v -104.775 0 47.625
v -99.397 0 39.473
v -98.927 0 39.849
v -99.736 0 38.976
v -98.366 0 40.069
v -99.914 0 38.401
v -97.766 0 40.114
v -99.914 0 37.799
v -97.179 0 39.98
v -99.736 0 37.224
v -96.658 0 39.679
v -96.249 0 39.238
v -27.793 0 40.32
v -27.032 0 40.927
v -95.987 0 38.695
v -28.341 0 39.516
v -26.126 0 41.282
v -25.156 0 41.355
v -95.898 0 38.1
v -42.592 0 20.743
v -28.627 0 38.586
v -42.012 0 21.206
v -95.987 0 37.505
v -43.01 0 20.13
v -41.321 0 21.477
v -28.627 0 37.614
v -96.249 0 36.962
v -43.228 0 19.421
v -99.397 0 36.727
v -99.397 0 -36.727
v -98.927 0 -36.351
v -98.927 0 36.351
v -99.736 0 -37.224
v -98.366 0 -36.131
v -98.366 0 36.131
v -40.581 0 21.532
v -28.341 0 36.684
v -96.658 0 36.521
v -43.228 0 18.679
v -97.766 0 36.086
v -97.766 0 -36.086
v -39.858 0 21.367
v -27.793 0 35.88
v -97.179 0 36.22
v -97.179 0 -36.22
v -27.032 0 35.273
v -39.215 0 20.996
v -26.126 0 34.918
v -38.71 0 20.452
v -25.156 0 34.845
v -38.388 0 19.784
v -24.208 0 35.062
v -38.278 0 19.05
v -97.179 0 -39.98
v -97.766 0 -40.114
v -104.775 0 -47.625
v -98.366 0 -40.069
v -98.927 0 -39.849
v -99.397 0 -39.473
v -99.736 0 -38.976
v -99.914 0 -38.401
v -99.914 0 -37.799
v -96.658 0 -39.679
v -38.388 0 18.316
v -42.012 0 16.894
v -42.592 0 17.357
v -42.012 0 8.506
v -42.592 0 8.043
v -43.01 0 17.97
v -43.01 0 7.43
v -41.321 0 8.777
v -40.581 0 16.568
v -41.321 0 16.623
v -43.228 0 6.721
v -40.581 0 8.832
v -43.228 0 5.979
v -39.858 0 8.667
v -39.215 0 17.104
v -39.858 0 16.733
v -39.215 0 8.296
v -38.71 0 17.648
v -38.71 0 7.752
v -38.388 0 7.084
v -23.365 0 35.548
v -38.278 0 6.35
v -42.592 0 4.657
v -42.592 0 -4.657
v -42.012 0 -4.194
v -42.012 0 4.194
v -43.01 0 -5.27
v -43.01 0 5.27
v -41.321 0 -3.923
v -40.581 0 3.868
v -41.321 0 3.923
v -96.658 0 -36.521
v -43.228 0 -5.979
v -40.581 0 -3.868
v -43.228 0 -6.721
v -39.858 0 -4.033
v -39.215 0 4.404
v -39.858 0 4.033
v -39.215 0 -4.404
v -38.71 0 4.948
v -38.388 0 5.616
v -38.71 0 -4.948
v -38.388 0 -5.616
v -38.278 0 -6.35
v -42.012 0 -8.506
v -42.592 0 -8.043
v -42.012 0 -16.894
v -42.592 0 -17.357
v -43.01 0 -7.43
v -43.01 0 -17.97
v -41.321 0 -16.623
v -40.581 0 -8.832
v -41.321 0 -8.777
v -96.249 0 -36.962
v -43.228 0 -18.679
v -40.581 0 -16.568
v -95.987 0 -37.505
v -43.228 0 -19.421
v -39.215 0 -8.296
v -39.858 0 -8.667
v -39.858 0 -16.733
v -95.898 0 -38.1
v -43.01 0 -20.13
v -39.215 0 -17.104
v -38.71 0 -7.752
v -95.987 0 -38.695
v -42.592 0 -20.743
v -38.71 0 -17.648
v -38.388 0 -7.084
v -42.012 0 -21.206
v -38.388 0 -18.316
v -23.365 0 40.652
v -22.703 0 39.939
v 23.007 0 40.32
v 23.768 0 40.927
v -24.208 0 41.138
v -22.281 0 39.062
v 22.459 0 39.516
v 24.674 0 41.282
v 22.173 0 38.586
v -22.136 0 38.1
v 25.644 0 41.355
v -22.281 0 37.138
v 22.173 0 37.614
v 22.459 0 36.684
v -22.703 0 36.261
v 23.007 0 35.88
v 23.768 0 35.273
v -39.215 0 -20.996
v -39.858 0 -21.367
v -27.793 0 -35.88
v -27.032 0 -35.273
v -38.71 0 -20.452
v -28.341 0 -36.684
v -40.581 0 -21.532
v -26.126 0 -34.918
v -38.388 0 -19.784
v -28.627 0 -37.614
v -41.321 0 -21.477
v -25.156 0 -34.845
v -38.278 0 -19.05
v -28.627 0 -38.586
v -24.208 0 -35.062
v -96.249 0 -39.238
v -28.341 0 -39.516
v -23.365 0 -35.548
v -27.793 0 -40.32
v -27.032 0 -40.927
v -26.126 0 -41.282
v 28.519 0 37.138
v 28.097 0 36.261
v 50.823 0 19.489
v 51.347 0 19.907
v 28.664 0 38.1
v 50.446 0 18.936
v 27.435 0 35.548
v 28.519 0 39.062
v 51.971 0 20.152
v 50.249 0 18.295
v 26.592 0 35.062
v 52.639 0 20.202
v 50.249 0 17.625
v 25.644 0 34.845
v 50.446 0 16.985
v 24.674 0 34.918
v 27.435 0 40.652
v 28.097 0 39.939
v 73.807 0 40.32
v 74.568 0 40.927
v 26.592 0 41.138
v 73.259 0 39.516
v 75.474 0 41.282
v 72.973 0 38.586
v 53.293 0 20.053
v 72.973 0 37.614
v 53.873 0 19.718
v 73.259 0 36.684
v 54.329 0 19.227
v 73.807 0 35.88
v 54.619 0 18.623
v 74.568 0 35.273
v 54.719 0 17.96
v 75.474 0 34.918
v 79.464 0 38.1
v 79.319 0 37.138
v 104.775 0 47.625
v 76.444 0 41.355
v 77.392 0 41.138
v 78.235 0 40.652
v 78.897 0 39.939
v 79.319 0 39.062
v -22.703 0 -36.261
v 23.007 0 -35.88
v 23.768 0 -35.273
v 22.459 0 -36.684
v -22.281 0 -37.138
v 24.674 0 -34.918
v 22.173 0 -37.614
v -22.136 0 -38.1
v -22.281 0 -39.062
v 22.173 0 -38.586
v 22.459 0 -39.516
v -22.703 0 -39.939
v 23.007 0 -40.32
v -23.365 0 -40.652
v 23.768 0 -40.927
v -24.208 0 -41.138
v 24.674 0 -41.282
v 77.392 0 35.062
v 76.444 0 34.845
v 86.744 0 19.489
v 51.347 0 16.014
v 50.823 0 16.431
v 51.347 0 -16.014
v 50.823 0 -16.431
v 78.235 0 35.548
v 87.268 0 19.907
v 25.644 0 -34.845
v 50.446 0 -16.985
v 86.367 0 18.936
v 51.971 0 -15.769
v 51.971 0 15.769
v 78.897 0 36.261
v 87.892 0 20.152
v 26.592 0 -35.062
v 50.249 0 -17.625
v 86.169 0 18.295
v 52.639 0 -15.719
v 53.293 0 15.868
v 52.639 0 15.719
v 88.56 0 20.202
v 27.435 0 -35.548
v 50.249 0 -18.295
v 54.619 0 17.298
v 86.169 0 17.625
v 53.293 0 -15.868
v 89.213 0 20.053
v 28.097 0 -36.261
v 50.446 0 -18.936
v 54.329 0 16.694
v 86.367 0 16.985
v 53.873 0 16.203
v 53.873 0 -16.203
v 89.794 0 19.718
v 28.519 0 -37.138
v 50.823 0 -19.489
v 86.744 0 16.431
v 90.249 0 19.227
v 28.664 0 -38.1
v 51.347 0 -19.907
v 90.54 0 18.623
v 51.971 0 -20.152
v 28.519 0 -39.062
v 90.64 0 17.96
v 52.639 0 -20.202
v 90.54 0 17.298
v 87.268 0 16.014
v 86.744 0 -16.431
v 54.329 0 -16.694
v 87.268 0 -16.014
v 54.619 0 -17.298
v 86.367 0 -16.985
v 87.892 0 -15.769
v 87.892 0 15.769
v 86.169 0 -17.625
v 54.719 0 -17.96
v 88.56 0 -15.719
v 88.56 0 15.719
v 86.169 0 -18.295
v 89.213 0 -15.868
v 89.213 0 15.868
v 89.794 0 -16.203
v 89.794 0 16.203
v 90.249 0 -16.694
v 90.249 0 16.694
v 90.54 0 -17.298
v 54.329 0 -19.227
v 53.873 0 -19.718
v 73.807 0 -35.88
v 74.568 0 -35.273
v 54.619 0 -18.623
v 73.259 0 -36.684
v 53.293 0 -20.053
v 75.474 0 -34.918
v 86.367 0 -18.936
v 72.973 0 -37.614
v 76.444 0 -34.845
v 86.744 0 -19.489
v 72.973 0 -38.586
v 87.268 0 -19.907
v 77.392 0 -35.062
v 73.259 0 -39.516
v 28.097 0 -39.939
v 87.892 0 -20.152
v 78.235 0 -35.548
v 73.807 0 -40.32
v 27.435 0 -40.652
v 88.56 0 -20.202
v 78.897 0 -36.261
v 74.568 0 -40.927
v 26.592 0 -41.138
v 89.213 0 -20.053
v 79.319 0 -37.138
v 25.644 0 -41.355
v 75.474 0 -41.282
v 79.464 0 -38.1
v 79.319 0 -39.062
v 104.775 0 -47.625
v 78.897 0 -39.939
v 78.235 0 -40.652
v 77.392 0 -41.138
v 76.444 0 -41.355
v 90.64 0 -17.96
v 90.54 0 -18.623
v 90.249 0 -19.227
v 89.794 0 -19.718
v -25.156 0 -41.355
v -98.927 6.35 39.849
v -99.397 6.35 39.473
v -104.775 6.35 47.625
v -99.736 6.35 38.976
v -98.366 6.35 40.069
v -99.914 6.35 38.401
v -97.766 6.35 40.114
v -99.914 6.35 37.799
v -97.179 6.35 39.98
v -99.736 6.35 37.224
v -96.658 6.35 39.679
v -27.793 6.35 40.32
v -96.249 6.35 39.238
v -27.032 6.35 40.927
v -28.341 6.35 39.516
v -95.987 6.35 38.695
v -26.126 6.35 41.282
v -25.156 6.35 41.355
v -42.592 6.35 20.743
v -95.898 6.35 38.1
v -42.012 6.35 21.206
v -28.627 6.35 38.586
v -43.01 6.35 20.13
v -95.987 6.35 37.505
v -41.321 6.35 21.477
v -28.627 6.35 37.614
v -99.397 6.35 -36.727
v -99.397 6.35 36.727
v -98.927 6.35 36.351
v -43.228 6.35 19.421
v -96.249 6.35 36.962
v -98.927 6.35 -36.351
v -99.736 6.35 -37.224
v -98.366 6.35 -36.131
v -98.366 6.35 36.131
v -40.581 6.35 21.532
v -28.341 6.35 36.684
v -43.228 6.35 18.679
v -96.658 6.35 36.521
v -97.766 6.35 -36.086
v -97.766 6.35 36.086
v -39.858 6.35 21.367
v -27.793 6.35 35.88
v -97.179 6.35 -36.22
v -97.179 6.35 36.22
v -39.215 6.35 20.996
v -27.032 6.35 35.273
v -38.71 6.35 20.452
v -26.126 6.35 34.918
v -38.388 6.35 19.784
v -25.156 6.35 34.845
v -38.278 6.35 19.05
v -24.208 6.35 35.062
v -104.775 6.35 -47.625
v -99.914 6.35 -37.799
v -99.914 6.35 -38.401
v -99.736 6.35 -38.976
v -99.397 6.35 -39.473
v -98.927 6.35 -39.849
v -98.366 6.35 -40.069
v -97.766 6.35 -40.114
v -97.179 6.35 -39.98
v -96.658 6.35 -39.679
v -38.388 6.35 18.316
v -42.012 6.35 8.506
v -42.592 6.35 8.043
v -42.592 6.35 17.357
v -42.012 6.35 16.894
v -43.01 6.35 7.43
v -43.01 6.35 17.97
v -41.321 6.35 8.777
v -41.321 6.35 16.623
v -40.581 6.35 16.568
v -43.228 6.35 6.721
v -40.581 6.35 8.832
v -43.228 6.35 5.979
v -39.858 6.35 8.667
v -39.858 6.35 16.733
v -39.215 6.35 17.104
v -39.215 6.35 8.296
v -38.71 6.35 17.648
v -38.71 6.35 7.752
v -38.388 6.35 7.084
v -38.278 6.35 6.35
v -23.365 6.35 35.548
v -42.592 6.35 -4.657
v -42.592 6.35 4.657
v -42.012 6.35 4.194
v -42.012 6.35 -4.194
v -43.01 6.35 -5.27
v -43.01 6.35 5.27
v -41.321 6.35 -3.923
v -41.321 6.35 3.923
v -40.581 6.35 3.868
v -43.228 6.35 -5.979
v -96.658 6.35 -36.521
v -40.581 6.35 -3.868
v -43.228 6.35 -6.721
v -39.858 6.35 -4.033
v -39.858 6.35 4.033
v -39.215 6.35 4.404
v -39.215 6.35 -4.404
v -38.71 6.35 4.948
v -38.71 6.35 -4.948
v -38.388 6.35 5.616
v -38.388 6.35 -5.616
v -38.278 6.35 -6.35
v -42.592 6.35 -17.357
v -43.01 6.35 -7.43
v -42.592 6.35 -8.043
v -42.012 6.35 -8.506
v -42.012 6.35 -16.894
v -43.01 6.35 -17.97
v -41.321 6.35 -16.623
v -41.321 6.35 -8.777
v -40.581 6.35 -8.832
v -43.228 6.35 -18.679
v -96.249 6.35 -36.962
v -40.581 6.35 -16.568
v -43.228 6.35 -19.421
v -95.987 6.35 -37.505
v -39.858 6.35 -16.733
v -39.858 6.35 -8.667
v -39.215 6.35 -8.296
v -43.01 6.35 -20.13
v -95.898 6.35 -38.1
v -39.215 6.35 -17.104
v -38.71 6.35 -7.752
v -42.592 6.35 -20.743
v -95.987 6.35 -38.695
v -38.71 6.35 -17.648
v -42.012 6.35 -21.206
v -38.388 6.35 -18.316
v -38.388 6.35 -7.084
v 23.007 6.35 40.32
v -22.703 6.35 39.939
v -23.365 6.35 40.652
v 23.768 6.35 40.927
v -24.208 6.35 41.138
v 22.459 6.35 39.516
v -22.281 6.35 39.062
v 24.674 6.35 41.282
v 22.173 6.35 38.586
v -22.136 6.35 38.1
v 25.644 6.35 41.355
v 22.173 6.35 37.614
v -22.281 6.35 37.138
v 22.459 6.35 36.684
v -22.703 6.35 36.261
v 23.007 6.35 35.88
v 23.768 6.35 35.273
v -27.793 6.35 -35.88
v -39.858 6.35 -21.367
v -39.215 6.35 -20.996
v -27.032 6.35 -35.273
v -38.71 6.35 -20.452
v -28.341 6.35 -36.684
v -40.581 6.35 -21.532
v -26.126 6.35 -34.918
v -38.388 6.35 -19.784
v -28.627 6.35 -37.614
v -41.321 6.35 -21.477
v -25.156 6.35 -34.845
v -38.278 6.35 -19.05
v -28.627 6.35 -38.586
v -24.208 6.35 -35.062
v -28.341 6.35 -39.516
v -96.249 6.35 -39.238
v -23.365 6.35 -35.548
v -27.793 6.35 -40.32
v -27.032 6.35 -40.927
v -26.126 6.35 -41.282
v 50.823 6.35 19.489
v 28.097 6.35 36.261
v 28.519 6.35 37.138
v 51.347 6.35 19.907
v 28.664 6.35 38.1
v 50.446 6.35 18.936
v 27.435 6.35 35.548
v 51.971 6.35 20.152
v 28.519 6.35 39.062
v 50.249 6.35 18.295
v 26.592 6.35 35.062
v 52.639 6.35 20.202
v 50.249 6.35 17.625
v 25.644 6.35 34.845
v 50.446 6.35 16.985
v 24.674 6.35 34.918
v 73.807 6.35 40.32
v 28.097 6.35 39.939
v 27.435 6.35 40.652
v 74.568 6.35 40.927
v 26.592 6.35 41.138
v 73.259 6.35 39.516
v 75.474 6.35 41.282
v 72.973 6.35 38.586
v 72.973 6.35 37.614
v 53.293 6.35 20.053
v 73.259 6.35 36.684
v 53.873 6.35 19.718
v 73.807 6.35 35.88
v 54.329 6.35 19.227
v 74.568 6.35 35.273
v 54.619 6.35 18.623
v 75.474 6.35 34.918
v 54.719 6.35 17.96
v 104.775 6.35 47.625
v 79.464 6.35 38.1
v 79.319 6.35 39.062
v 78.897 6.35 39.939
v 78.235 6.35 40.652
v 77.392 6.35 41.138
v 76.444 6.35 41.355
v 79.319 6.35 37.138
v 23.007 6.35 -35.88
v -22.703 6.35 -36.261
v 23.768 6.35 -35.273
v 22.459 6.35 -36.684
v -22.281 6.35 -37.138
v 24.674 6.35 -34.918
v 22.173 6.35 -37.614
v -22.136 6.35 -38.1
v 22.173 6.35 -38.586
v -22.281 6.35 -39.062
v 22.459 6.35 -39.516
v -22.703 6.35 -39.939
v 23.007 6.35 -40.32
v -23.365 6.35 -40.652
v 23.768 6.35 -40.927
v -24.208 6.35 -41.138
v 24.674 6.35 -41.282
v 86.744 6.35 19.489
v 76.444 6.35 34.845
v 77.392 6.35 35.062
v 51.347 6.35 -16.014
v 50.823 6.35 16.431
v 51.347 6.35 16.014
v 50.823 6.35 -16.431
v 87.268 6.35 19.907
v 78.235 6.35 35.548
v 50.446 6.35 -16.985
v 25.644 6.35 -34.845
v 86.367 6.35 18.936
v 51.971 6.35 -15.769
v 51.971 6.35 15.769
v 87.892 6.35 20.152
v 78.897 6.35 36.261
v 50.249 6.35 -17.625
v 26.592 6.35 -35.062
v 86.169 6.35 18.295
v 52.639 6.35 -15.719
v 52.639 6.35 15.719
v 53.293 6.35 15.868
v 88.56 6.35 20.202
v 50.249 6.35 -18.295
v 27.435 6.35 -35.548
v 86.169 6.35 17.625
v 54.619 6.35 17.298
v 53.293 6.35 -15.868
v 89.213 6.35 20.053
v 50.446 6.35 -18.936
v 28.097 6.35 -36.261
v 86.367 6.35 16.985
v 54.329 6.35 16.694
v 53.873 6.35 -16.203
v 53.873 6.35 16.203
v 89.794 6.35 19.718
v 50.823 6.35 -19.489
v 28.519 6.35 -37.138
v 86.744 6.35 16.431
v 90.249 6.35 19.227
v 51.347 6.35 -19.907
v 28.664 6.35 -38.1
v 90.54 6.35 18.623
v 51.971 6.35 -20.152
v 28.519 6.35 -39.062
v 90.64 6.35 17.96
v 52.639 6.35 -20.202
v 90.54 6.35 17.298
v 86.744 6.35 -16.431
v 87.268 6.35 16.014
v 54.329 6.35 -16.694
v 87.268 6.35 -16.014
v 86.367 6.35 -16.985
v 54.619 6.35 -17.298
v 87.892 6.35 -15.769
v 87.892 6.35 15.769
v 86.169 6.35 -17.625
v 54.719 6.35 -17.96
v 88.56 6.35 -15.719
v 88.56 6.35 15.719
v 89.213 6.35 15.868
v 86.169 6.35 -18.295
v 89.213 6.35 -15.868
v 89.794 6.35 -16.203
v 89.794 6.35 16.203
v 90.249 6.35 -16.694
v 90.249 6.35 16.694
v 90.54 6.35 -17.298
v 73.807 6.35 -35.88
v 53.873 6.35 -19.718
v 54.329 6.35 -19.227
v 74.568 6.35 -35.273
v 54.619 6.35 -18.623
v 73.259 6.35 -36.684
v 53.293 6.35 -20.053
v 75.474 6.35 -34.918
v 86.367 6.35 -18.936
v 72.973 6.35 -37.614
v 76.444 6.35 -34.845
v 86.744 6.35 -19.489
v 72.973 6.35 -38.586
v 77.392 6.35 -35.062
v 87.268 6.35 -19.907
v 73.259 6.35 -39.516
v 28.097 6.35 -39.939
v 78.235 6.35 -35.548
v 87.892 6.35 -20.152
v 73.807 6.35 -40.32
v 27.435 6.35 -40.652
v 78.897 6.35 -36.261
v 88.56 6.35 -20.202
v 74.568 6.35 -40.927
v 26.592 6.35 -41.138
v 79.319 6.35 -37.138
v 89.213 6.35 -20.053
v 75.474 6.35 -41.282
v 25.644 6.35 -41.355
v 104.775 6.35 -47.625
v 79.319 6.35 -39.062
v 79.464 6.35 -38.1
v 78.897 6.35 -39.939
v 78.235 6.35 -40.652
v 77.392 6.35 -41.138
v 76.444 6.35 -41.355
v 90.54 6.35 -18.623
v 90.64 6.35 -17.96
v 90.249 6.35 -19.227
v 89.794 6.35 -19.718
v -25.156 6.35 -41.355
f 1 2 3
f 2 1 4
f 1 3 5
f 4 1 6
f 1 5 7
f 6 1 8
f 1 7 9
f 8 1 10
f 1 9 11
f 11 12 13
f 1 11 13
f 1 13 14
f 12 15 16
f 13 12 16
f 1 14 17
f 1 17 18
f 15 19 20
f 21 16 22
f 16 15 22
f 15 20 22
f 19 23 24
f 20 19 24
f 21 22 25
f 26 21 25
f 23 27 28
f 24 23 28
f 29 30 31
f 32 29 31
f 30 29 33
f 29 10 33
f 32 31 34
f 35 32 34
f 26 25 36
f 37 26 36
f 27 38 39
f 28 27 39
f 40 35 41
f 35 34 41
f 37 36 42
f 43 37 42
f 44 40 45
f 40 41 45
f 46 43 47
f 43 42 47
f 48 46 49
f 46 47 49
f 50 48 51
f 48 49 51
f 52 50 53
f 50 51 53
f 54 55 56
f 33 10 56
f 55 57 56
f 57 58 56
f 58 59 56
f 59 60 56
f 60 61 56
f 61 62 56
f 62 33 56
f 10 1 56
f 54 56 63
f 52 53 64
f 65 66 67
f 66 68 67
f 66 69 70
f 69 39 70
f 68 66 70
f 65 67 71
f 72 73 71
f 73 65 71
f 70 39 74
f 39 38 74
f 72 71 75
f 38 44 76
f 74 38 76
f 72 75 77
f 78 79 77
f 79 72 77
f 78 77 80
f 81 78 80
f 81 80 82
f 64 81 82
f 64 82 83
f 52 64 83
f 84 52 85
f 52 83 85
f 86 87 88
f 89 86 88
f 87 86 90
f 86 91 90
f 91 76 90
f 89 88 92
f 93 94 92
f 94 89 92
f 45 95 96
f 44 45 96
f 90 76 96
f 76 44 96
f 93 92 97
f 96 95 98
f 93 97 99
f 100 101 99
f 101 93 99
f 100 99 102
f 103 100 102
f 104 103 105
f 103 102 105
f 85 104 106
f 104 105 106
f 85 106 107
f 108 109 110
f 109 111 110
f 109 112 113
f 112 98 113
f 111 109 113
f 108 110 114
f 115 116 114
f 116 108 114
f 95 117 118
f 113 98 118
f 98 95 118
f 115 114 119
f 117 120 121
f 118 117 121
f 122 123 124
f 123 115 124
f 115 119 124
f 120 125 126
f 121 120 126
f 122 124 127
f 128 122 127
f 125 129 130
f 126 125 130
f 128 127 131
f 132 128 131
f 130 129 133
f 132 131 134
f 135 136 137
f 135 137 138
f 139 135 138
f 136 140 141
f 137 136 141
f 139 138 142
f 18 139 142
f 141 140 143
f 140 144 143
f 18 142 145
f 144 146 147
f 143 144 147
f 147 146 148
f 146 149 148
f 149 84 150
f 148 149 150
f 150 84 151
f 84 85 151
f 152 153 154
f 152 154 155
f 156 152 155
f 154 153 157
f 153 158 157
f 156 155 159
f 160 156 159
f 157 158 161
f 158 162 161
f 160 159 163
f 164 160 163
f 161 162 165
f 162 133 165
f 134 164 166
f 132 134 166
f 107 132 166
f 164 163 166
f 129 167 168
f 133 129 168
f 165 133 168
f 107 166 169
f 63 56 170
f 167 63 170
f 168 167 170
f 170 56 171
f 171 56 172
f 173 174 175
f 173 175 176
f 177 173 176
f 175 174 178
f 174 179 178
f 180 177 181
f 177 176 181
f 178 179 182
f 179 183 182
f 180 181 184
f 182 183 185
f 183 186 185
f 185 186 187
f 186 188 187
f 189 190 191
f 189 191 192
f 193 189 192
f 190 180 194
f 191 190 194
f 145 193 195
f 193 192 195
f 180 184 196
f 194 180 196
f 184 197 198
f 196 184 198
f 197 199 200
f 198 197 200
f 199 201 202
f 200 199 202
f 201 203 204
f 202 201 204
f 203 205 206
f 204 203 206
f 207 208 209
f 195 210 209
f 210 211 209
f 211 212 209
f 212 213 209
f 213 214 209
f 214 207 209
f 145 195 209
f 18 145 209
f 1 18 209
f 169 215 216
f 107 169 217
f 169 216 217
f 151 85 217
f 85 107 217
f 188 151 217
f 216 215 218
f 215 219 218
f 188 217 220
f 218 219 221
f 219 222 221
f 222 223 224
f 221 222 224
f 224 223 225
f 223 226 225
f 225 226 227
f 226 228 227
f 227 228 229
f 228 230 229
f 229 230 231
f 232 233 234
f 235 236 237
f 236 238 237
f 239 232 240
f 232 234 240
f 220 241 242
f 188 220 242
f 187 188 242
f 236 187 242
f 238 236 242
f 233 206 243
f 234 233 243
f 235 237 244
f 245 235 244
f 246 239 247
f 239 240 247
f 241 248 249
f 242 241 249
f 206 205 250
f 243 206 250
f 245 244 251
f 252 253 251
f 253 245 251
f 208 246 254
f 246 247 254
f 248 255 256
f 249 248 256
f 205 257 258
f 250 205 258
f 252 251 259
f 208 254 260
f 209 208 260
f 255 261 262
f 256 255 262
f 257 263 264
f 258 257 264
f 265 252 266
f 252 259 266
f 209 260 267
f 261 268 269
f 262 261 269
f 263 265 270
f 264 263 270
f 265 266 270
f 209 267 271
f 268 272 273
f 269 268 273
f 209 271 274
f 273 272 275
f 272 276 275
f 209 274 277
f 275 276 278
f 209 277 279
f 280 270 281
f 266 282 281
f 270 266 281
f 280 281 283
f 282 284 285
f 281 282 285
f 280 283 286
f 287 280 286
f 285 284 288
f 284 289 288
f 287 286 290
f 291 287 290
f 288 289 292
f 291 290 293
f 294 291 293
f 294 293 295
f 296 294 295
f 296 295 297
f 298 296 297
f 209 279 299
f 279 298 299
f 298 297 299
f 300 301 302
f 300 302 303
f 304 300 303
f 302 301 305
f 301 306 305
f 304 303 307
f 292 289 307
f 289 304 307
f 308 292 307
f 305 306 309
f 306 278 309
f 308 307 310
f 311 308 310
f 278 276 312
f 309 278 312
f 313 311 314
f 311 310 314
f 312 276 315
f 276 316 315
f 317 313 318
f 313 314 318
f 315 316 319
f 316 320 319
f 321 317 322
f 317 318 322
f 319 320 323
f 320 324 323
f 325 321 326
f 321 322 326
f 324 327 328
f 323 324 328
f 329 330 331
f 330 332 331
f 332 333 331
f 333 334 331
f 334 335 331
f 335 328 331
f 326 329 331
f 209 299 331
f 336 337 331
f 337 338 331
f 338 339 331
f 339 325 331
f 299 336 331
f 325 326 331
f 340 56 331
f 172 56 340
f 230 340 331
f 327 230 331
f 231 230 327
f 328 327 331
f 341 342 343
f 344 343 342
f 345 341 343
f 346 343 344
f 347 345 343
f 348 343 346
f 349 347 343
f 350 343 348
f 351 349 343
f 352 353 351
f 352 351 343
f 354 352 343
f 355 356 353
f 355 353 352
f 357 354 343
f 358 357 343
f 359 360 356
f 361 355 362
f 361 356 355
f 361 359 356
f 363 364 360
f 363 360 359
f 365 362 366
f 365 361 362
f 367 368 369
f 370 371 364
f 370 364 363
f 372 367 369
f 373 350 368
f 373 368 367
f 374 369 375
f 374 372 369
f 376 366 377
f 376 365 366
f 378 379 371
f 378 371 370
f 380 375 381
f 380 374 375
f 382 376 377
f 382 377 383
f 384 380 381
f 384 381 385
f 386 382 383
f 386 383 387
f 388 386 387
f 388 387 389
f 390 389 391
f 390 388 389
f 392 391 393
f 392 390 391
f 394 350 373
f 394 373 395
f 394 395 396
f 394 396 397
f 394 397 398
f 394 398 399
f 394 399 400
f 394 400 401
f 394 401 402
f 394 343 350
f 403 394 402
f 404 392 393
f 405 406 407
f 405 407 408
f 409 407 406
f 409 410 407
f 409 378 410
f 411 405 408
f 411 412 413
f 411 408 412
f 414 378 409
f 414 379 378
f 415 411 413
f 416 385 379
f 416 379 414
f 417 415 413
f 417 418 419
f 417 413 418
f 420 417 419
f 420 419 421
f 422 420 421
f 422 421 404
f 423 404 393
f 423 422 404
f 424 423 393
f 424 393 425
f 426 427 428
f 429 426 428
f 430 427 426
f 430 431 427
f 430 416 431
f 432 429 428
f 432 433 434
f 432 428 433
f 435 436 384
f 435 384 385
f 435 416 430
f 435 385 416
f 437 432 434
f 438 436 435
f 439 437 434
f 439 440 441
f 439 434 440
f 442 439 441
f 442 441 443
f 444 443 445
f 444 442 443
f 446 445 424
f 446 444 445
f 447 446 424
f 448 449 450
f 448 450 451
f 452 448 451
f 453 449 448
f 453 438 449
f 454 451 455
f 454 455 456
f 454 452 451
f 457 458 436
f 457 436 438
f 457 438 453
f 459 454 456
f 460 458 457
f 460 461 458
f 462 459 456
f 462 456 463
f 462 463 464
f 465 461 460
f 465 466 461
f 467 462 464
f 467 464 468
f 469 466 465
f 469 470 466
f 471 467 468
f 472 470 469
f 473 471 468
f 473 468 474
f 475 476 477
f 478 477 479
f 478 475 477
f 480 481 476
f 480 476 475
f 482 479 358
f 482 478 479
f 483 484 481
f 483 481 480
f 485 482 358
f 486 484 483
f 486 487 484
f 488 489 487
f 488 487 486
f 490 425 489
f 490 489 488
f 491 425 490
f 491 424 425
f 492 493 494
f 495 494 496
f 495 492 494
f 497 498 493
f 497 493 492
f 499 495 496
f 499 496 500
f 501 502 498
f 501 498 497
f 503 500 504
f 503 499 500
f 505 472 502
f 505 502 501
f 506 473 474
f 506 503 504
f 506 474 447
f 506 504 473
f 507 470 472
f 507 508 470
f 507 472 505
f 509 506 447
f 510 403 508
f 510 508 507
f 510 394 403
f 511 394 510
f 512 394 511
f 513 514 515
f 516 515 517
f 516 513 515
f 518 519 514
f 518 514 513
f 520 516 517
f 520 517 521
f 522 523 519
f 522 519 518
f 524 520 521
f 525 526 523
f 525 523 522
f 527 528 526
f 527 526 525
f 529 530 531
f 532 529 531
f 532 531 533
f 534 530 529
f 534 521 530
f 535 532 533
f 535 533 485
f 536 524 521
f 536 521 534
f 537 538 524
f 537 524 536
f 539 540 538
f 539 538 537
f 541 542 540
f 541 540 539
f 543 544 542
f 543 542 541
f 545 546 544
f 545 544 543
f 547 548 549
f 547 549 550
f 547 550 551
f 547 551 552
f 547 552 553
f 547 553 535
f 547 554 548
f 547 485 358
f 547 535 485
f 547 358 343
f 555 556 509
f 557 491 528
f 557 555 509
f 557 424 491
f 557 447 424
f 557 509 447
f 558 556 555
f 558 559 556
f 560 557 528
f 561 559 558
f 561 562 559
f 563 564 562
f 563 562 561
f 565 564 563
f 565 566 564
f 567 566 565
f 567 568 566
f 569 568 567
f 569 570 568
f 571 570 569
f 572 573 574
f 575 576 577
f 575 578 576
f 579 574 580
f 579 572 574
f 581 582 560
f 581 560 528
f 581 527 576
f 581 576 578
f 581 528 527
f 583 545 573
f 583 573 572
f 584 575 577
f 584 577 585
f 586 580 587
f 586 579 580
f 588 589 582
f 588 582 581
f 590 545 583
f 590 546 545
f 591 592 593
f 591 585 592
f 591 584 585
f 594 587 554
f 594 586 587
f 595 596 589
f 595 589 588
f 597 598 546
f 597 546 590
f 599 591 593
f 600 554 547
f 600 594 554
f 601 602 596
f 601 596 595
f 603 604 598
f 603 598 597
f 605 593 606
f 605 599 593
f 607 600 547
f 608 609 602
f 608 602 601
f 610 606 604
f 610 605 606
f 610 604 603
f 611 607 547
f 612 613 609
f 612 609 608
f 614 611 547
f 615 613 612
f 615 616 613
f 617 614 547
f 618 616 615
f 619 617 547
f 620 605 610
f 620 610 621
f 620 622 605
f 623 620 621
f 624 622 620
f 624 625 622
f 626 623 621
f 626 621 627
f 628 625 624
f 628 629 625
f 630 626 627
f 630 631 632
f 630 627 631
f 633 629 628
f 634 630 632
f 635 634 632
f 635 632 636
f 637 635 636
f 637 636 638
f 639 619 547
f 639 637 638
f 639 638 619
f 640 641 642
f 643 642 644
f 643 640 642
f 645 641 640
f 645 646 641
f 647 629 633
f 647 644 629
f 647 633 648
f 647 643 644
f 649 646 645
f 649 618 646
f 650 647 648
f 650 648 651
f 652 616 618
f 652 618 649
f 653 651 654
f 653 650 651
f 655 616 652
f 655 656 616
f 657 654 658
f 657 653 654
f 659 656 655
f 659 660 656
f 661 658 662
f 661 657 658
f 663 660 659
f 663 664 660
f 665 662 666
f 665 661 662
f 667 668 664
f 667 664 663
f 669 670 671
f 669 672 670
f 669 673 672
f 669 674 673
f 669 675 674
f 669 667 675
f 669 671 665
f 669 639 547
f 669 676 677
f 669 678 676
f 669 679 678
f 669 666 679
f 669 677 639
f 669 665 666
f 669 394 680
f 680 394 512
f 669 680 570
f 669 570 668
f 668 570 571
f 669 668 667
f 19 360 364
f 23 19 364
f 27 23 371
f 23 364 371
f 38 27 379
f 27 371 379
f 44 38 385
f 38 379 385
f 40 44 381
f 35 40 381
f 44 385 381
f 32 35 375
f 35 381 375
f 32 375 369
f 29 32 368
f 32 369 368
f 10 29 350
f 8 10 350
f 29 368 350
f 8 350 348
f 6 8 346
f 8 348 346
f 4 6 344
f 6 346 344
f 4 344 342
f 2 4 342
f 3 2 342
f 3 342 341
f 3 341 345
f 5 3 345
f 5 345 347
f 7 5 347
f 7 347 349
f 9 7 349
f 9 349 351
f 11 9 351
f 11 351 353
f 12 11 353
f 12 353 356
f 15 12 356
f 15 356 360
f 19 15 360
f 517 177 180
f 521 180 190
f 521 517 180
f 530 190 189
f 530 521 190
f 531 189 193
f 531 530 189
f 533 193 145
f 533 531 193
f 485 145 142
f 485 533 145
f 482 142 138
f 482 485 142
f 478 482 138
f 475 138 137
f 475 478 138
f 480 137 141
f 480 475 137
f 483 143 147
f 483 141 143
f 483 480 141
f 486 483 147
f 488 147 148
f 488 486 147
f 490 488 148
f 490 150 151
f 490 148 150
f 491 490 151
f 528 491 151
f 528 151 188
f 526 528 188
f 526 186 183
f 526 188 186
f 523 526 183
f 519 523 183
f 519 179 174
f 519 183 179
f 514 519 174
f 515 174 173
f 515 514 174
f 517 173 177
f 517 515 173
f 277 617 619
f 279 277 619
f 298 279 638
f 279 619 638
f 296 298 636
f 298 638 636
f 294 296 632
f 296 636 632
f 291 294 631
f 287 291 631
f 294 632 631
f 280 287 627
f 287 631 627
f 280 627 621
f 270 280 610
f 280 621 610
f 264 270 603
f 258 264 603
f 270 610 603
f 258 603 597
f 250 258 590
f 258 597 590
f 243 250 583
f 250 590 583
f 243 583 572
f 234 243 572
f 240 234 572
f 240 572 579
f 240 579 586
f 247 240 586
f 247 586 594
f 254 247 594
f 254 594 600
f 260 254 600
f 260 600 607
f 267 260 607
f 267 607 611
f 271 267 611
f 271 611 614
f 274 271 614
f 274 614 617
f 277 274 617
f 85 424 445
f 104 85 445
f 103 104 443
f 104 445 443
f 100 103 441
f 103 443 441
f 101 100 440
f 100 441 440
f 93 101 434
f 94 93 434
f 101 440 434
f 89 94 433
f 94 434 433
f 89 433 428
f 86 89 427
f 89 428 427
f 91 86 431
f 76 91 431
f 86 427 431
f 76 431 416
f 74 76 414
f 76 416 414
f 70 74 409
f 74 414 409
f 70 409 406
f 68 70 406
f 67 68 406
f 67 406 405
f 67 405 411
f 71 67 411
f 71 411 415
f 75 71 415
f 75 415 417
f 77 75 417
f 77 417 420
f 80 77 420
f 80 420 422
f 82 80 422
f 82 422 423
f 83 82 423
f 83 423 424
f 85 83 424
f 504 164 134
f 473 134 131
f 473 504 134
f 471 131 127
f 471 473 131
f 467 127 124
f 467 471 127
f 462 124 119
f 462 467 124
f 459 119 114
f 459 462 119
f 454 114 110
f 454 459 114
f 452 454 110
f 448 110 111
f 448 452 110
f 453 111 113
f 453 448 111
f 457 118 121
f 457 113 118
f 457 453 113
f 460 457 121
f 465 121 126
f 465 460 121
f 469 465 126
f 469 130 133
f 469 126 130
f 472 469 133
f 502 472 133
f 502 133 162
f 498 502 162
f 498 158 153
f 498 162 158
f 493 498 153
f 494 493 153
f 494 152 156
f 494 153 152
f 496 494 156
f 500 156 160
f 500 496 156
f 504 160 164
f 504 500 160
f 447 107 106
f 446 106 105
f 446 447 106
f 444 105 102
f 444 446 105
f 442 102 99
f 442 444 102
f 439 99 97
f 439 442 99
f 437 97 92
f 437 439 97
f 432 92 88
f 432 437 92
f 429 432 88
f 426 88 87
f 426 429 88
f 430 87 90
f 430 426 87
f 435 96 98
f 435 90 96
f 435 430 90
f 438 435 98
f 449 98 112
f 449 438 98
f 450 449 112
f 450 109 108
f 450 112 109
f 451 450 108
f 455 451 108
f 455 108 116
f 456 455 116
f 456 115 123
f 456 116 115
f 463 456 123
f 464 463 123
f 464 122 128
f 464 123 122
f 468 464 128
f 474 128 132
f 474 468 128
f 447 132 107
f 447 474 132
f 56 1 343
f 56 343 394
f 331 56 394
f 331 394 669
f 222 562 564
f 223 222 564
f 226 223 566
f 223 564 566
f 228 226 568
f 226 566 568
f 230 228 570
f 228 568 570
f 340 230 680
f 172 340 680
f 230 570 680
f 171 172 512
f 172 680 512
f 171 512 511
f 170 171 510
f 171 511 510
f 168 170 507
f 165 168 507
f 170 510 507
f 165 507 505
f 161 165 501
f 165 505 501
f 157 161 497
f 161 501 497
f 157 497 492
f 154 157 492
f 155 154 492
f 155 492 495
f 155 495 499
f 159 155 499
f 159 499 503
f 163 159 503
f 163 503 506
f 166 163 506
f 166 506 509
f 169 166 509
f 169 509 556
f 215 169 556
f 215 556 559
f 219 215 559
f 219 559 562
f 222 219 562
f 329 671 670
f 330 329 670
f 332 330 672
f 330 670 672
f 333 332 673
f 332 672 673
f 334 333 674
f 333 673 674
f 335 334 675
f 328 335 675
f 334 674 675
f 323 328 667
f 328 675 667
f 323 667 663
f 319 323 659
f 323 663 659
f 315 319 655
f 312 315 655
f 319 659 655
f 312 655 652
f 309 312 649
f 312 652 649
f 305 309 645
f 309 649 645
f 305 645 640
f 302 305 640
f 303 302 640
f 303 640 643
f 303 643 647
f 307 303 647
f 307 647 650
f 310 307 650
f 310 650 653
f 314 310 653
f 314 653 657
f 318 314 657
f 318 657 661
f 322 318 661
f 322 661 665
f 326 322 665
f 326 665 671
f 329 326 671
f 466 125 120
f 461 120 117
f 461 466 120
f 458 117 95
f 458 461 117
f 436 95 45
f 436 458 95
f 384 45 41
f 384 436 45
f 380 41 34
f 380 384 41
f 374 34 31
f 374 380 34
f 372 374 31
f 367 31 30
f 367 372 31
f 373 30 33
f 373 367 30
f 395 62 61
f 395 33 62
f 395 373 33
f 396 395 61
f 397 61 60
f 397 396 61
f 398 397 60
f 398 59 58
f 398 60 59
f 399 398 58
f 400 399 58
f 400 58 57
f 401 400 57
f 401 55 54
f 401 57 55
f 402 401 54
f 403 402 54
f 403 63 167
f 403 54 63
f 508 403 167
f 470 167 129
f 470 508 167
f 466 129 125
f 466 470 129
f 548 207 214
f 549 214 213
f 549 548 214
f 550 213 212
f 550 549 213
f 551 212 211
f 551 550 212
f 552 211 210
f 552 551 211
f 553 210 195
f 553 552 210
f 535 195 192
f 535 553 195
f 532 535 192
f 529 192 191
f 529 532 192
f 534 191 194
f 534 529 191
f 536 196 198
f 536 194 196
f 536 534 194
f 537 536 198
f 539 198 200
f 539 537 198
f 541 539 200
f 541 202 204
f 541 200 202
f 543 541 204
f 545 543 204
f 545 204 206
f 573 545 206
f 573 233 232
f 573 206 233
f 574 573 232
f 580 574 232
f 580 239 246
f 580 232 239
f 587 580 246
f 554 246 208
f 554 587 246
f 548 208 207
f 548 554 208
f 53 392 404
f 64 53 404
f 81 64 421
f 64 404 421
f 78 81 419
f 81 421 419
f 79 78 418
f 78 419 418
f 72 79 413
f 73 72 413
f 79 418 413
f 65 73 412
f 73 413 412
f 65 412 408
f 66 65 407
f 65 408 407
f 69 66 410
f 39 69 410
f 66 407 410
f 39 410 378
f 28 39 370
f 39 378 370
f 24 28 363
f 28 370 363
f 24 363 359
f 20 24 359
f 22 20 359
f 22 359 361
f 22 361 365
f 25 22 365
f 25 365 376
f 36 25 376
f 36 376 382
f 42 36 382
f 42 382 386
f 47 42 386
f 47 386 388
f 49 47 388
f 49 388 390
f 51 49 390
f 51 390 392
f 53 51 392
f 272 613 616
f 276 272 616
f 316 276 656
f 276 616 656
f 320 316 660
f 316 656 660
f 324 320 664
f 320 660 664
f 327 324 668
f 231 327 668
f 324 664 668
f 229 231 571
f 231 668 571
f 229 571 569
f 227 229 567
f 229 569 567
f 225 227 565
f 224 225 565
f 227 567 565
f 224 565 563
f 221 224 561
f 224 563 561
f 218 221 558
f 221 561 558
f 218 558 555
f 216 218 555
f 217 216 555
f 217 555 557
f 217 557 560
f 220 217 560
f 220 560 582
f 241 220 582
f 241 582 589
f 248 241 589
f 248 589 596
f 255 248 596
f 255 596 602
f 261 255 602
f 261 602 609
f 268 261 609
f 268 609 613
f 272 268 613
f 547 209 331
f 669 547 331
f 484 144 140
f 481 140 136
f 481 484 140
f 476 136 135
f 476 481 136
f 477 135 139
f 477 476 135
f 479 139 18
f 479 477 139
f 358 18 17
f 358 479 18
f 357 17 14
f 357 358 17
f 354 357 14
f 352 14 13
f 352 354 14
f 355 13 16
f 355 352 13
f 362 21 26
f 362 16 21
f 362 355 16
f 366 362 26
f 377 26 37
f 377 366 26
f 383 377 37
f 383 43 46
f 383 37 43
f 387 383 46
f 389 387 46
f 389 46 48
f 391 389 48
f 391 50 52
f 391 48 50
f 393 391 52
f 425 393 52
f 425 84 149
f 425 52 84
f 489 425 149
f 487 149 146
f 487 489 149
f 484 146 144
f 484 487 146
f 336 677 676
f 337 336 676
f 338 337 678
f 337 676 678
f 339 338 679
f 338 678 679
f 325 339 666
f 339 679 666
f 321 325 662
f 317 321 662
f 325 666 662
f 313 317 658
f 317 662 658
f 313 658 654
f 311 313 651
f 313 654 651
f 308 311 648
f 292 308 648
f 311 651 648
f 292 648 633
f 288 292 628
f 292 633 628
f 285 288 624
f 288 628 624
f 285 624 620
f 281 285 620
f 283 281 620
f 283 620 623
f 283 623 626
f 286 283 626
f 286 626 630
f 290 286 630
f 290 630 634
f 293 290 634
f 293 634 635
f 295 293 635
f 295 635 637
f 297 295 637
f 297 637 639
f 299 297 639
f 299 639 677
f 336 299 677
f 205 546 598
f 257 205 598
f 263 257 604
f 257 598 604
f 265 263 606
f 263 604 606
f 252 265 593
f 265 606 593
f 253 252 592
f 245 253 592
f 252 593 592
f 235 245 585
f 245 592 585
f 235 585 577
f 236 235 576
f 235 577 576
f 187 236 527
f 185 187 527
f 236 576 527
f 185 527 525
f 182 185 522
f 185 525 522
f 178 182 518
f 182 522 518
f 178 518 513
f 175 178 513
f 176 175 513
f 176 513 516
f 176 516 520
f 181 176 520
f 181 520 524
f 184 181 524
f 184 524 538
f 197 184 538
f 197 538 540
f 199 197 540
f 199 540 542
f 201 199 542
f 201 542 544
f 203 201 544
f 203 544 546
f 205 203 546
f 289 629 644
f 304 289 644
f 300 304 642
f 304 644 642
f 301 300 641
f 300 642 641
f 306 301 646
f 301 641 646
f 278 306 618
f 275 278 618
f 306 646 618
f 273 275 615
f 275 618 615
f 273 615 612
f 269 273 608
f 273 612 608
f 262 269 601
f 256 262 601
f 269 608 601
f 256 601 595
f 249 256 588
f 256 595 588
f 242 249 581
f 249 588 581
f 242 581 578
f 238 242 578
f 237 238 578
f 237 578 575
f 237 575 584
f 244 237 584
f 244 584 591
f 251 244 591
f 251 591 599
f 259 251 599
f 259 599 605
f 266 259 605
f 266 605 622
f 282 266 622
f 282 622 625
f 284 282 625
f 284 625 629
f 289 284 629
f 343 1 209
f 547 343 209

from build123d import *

# Parameters (mm, degrees)
SKETCH1_W           = 209.55
SKETCH1_H           = 95.25
BOSS_EXTRUDE1_DEPTH = 6.35
SKETCH2_R           = 2.0193
CUT_EXTRUDE1_DEPTH  = 7.35
SKETCH3_R           = 2.4892
CUT_EXTRUDE2_DEPTH  = 7.35
SKETCH4_R           = 2.2479
CUT_EXTRUDE3_DEPTH  = 7.35
SKETCH5_R           = 3.2639
CUT_EXTRUDE4_DEPTH  = 7.35


with BuildPart() as part:
    # Sketch1 → Boss-Extrude1 (new body)
    with BuildSketch(Plane(origin=(0, 0, 0), x_dir=(1, 0, 0), z_dir=(0, 1, 0))):
        Rectangle(SKETCH1_W, SKETCH1_H)
    extrude(amount=BOSS_EXTRUDE1_DEPTH)

    # Sketch2 → Cut-Extrude1 (cut, through all)
    with BuildSketch(Plane(origin=(0, 6.35, 0), x_dir=(1, 0, 0), z_dir=(0, 1, 0))):
        with Locations((-97.917, -38.1)):
            Circle(SKETCH2_R)
    cut_extrude1 = extrude(amount=-CUT_EXTRUDE1_DEPTH, mode=Mode.SUBTRACT)

    # Mirror1: Cut-Extrude1 across plane
    add(cut_extrude1.mirror(Plane.XY), mode=Mode.SUBTRACT)

    # Sketch3 → Cut-Extrude2 (cut, through all)
    with BuildSketch(Plane(origin=(0, 6.35, 0), x_dir=(1, 0, 0), z_dir=(0, 1, 0))):
        with Locations((-40.767, -6.35)):
            Circle(SKETCH3_R)
        with Locations((-40.767, -19.05)):
            Circle(SKETCH3_R)
    cut_extrude2 = extrude(amount=-CUT_EXTRUDE2_DEPTH, mode=Mode.SUBTRACT)

    # Mirror2: Cut-Extrude2 across plane
    add(cut_extrude2.mirror(Plane.XY), mode=Mode.SUBTRACT)

    # Sketch4 → Cut-Extrude3 (cut, through all)
    with BuildSketch(Plane(origin=(0, 6.35, 0), x_dir=(1, 0, 0), z_dir=(0, 1, 0))):
        with Locations((52.47132, 17.96034)):
            Circle(SKETCH4_R)
        with Locations((88.392, 17.96034)):
            Circle(SKETCH4_R)
        with Locations((88.392, -17.96034)):
            Circle(SKETCH4_R)
        with Locations((52.47132, -17.96034)):
            Circle(SKETCH4_R)
    extrude(amount=-CUT_EXTRUDE3_DEPTH, mode=Mode.SUBTRACT)

    # Sketch5 → Cut-Extrude4 (cut, through all)
    with BuildSketch(Plane(origin=(0, 6.35, 0), x_dir=(1, 0, 0), z_dir=(0, 1, 0))):
        with Locations((-25.4, 38.1)):
            Circle(SKETCH5_R)
        with Locations((25.4, 38.1)):
            Circle(SKETCH5_R)
        with Locations((76.2, 38.1)):
            Circle(SKETCH5_R)
    cut_extrude4 = extrude(amount=-CUT_EXTRUDE4_DEPTH, mode=Mode.SUBTRACT)

    # Mirror3: Cut-Extrude4 across plane
    add(cut_extrude4.mirror(Plane.XY), mode=Mode.SUBTRACT)


solid = part.part
